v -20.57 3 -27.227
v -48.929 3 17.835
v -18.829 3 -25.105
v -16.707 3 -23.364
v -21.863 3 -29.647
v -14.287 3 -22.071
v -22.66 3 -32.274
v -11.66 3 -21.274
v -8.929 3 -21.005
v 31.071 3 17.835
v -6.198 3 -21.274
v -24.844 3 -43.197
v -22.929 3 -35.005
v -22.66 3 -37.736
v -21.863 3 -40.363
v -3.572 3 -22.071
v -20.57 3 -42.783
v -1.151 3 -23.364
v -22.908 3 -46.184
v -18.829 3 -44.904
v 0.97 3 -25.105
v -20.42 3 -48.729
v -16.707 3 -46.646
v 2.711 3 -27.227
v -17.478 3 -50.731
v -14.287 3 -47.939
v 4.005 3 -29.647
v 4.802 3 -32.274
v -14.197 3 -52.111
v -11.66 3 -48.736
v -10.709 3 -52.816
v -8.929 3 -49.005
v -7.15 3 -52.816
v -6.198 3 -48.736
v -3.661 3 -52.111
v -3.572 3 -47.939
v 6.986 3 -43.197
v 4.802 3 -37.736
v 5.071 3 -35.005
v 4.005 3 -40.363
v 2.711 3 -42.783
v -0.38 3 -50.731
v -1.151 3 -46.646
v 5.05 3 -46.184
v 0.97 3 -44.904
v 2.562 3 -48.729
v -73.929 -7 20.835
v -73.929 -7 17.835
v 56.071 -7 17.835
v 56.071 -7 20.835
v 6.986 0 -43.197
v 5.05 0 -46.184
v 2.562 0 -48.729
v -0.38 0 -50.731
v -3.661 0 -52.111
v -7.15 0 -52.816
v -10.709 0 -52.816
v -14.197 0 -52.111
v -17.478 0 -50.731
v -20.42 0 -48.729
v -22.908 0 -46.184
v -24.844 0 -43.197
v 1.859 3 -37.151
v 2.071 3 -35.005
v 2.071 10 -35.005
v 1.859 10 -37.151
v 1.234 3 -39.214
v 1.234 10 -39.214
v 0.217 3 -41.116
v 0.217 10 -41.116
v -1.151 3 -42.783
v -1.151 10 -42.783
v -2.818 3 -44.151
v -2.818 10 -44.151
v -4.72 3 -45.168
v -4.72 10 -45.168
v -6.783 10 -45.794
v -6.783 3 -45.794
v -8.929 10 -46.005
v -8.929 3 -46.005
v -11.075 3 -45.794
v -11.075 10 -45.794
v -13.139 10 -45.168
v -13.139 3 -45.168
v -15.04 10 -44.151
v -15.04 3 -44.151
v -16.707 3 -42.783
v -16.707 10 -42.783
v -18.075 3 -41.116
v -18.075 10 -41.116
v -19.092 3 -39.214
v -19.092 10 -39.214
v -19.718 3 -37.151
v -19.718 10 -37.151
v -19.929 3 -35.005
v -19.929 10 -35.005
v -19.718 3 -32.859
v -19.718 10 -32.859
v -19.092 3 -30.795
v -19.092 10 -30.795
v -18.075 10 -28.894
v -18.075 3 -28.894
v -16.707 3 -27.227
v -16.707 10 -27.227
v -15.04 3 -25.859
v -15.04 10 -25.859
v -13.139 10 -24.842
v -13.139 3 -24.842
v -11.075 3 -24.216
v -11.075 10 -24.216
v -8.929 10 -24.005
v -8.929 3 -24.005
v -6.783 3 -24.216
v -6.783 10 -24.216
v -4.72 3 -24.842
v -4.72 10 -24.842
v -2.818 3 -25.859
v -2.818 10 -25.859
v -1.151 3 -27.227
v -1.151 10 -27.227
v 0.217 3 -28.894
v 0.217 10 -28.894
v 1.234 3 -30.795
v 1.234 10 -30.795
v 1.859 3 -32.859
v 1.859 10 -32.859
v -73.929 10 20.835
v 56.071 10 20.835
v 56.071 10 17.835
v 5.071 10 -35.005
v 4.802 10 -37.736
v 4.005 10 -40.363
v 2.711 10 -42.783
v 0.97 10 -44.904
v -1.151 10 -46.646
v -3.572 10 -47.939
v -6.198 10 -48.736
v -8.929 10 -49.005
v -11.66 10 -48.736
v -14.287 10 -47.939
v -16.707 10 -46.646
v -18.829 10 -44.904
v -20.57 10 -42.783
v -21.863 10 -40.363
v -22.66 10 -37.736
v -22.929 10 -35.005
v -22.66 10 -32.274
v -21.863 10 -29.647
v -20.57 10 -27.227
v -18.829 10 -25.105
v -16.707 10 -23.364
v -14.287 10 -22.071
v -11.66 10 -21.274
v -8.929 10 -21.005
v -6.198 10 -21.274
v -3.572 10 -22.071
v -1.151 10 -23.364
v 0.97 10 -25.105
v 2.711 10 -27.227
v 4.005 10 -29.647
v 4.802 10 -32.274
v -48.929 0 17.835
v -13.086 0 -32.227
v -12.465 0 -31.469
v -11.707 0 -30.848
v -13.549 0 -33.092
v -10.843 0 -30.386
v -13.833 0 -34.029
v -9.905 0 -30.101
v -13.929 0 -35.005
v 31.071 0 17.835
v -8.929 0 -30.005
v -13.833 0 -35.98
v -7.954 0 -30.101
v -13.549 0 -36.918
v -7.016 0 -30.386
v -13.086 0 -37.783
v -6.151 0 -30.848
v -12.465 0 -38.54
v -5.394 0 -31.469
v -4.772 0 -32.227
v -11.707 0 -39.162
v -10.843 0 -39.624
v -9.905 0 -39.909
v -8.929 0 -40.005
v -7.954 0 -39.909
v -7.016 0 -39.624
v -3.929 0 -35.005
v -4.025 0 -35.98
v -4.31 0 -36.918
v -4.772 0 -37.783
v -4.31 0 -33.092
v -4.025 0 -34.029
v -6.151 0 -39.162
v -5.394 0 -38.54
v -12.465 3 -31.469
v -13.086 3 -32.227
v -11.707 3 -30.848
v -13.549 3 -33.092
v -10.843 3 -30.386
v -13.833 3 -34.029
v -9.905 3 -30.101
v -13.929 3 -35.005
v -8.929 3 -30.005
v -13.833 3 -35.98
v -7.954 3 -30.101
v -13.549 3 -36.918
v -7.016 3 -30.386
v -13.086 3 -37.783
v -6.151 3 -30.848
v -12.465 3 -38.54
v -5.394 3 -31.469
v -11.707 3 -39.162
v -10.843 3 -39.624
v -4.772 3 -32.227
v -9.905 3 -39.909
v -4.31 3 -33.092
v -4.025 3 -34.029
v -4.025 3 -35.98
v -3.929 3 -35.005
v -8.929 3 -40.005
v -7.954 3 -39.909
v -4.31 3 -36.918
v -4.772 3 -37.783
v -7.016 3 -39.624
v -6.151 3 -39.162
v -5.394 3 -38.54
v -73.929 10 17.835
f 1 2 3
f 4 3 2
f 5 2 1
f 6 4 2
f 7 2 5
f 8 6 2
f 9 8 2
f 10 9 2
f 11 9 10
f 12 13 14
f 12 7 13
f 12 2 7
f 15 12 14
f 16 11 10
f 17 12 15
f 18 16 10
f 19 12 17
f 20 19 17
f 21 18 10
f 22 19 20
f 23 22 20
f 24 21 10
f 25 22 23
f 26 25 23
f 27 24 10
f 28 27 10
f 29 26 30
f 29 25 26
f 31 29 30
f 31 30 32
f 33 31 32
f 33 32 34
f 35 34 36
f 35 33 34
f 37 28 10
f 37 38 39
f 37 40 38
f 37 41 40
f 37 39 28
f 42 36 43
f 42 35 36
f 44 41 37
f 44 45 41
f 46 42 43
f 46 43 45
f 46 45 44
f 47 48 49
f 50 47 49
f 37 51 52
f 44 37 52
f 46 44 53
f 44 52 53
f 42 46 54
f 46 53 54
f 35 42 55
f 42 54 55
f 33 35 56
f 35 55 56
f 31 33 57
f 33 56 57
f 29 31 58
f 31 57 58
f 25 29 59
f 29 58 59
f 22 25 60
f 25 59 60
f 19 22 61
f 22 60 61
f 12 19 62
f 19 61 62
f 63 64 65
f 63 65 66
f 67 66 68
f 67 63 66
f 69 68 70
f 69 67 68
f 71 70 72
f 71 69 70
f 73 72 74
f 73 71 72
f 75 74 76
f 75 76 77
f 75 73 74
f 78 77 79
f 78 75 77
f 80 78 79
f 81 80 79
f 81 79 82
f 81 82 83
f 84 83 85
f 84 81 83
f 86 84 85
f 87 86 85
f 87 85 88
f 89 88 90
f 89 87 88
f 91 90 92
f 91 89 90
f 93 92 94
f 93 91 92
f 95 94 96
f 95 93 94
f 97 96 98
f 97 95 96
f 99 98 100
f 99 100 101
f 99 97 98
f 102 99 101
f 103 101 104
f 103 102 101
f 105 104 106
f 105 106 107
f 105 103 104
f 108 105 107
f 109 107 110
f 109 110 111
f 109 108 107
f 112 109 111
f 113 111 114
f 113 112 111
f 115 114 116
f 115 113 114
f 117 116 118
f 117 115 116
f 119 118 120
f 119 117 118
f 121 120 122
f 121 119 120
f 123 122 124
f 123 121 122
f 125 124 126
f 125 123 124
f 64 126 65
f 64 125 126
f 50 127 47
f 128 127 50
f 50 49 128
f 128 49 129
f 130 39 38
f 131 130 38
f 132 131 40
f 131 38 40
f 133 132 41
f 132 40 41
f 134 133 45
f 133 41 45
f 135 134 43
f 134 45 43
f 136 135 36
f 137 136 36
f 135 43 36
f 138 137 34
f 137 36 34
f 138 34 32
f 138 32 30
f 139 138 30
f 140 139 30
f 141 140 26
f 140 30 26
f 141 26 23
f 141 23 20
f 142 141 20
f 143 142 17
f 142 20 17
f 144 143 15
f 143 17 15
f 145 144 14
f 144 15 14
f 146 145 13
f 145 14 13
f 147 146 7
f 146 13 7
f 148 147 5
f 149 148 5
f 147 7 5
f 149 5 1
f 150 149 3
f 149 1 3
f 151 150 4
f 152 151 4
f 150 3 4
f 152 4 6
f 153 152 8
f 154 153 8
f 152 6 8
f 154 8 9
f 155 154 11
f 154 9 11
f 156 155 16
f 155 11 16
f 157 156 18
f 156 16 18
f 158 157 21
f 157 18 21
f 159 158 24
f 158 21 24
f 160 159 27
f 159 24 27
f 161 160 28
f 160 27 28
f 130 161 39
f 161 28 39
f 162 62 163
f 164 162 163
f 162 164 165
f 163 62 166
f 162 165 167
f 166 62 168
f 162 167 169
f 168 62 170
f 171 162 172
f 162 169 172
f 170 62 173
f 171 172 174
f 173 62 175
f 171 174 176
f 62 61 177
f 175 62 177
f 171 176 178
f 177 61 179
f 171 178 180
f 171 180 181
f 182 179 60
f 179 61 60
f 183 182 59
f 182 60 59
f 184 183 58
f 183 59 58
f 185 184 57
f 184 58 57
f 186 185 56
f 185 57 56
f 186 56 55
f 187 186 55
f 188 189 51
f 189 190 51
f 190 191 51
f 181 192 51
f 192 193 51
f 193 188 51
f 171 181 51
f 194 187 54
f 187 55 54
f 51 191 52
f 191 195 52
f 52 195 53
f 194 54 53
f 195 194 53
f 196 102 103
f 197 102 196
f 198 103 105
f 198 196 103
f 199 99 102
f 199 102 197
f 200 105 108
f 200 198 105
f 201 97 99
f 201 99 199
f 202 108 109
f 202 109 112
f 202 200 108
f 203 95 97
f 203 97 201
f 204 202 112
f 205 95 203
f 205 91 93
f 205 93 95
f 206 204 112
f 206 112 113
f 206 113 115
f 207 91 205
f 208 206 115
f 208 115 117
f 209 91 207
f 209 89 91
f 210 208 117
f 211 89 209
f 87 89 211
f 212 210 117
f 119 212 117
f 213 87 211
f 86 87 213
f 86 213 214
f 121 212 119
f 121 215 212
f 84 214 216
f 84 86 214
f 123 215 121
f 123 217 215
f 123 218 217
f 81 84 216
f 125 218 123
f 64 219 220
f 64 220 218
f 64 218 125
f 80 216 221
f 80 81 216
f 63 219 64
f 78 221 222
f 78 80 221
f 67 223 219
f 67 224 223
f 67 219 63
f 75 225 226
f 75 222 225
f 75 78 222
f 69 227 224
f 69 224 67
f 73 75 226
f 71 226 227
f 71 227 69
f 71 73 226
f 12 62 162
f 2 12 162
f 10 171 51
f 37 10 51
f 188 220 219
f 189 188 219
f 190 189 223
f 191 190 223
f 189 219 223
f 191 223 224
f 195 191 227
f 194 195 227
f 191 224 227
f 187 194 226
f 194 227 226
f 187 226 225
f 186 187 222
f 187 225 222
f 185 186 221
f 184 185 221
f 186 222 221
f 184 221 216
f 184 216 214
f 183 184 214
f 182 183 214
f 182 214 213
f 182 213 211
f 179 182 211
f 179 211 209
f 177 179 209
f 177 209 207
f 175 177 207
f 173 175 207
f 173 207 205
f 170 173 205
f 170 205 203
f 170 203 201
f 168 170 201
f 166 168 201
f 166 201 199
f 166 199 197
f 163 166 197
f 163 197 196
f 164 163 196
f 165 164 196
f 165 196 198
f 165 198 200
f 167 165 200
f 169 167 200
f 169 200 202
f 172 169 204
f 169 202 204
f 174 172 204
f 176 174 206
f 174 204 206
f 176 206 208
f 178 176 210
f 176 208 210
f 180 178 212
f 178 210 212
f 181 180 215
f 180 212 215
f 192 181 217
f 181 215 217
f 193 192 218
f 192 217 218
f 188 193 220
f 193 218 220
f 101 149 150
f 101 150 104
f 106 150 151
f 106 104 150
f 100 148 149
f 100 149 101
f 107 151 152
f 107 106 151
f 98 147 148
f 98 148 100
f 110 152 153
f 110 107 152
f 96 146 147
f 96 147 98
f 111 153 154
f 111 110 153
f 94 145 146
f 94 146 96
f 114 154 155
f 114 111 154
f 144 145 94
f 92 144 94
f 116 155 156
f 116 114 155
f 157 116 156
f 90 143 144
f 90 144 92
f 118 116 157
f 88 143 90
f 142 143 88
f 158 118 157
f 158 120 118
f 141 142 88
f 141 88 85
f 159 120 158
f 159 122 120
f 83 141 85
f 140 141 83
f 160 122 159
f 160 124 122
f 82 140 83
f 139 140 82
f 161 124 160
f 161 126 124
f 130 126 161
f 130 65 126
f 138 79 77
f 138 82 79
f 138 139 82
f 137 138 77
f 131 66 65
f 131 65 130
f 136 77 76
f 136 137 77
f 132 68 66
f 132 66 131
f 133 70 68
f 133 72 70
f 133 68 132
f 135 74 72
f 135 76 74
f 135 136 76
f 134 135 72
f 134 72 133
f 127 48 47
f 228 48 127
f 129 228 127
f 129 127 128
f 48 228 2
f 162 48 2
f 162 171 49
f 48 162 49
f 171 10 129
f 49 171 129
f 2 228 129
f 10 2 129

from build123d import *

# Parameters (mm, degrees)
BOSS_EXTRUDE1_DEPTH = 3
SKETCH2_R           = 14
SKETCH2_R_2         = 11
BOSS_EXTRUDE2_DEPTH = 7
SKETCH3_W           = 130
SKETCH3_H           = 17
BOSS_EXTRUDE3_DEPTH = 3
SKETCH5_R           = 5
CUT_EXTRUDE1_DEPTH  = 10


with BuildPart() as part:
    # Sketch1 → Boss-Extrude1 (new body)
    with BuildSketch(Plane(origin=(0, 0, 0), x_dir=(1, 0, 0), z_dir=(0, 1, 0))):
        with BuildLine():
            Line((-48.929144451, -17.835062273), (31.070855549, -17.835062273))
            Line((31.070855549, -17.835062273), (6.985518971, 43.196988966))
            ThreePointArc((6.985518971, 43.196988966), (-8.929144451, 52.904273338), (-24.843807874, 43.196988966))
            Line((-24.843807874, 43.196988966), (-48.929144451, -17.835062273))
        make_face()
    extrude(amount=BOSS_EXTRUDE1_DEPTH)

    # Sketch2 → Boss-Extrude2 (add)
    with BuildSketch(Plane(origin=(0, 3, 0), x_dir=(1, 0, 0), z_dir=(0, 1, 0))):
        with Locations((-8.929144451, 35.004937727)):
            Circle(SKETCH2_R)
        with Locations((-8.929144451, 35.004937727)):
            Circle(SKETCH2_R_2, mode=Mode.SUBTRACT)
    extrude(amount=BOSS_EXTRUDE2_DEPTH)

    # Sketch3 → Boss-Extrude3 (add)
    with BuildSketch(Plane.XY.offset(17.835062273)):
        with Locations((-8.929144451, 1.5)):
            Rectangle(SKETCH3_W, SKETCH3_H)
    extrude(amount=BOSS_EXTRUDE3_DEPTH)

    # Sketch5 → Cut-Extrude1 (cut)
    with BuildSketch(Plane(origin=(0, 3, 0), x_dir=(1, 0, 0), z_dir=(0, 1, 0))):
        with Locations((-8.929144451, 35.004937727)):
            Circle(SKETCH5_R)
    extrude(amount=-CUT_EXTRUDE1_DEPTH, mode=Mode.SUBTRACT)


solid = part.part
